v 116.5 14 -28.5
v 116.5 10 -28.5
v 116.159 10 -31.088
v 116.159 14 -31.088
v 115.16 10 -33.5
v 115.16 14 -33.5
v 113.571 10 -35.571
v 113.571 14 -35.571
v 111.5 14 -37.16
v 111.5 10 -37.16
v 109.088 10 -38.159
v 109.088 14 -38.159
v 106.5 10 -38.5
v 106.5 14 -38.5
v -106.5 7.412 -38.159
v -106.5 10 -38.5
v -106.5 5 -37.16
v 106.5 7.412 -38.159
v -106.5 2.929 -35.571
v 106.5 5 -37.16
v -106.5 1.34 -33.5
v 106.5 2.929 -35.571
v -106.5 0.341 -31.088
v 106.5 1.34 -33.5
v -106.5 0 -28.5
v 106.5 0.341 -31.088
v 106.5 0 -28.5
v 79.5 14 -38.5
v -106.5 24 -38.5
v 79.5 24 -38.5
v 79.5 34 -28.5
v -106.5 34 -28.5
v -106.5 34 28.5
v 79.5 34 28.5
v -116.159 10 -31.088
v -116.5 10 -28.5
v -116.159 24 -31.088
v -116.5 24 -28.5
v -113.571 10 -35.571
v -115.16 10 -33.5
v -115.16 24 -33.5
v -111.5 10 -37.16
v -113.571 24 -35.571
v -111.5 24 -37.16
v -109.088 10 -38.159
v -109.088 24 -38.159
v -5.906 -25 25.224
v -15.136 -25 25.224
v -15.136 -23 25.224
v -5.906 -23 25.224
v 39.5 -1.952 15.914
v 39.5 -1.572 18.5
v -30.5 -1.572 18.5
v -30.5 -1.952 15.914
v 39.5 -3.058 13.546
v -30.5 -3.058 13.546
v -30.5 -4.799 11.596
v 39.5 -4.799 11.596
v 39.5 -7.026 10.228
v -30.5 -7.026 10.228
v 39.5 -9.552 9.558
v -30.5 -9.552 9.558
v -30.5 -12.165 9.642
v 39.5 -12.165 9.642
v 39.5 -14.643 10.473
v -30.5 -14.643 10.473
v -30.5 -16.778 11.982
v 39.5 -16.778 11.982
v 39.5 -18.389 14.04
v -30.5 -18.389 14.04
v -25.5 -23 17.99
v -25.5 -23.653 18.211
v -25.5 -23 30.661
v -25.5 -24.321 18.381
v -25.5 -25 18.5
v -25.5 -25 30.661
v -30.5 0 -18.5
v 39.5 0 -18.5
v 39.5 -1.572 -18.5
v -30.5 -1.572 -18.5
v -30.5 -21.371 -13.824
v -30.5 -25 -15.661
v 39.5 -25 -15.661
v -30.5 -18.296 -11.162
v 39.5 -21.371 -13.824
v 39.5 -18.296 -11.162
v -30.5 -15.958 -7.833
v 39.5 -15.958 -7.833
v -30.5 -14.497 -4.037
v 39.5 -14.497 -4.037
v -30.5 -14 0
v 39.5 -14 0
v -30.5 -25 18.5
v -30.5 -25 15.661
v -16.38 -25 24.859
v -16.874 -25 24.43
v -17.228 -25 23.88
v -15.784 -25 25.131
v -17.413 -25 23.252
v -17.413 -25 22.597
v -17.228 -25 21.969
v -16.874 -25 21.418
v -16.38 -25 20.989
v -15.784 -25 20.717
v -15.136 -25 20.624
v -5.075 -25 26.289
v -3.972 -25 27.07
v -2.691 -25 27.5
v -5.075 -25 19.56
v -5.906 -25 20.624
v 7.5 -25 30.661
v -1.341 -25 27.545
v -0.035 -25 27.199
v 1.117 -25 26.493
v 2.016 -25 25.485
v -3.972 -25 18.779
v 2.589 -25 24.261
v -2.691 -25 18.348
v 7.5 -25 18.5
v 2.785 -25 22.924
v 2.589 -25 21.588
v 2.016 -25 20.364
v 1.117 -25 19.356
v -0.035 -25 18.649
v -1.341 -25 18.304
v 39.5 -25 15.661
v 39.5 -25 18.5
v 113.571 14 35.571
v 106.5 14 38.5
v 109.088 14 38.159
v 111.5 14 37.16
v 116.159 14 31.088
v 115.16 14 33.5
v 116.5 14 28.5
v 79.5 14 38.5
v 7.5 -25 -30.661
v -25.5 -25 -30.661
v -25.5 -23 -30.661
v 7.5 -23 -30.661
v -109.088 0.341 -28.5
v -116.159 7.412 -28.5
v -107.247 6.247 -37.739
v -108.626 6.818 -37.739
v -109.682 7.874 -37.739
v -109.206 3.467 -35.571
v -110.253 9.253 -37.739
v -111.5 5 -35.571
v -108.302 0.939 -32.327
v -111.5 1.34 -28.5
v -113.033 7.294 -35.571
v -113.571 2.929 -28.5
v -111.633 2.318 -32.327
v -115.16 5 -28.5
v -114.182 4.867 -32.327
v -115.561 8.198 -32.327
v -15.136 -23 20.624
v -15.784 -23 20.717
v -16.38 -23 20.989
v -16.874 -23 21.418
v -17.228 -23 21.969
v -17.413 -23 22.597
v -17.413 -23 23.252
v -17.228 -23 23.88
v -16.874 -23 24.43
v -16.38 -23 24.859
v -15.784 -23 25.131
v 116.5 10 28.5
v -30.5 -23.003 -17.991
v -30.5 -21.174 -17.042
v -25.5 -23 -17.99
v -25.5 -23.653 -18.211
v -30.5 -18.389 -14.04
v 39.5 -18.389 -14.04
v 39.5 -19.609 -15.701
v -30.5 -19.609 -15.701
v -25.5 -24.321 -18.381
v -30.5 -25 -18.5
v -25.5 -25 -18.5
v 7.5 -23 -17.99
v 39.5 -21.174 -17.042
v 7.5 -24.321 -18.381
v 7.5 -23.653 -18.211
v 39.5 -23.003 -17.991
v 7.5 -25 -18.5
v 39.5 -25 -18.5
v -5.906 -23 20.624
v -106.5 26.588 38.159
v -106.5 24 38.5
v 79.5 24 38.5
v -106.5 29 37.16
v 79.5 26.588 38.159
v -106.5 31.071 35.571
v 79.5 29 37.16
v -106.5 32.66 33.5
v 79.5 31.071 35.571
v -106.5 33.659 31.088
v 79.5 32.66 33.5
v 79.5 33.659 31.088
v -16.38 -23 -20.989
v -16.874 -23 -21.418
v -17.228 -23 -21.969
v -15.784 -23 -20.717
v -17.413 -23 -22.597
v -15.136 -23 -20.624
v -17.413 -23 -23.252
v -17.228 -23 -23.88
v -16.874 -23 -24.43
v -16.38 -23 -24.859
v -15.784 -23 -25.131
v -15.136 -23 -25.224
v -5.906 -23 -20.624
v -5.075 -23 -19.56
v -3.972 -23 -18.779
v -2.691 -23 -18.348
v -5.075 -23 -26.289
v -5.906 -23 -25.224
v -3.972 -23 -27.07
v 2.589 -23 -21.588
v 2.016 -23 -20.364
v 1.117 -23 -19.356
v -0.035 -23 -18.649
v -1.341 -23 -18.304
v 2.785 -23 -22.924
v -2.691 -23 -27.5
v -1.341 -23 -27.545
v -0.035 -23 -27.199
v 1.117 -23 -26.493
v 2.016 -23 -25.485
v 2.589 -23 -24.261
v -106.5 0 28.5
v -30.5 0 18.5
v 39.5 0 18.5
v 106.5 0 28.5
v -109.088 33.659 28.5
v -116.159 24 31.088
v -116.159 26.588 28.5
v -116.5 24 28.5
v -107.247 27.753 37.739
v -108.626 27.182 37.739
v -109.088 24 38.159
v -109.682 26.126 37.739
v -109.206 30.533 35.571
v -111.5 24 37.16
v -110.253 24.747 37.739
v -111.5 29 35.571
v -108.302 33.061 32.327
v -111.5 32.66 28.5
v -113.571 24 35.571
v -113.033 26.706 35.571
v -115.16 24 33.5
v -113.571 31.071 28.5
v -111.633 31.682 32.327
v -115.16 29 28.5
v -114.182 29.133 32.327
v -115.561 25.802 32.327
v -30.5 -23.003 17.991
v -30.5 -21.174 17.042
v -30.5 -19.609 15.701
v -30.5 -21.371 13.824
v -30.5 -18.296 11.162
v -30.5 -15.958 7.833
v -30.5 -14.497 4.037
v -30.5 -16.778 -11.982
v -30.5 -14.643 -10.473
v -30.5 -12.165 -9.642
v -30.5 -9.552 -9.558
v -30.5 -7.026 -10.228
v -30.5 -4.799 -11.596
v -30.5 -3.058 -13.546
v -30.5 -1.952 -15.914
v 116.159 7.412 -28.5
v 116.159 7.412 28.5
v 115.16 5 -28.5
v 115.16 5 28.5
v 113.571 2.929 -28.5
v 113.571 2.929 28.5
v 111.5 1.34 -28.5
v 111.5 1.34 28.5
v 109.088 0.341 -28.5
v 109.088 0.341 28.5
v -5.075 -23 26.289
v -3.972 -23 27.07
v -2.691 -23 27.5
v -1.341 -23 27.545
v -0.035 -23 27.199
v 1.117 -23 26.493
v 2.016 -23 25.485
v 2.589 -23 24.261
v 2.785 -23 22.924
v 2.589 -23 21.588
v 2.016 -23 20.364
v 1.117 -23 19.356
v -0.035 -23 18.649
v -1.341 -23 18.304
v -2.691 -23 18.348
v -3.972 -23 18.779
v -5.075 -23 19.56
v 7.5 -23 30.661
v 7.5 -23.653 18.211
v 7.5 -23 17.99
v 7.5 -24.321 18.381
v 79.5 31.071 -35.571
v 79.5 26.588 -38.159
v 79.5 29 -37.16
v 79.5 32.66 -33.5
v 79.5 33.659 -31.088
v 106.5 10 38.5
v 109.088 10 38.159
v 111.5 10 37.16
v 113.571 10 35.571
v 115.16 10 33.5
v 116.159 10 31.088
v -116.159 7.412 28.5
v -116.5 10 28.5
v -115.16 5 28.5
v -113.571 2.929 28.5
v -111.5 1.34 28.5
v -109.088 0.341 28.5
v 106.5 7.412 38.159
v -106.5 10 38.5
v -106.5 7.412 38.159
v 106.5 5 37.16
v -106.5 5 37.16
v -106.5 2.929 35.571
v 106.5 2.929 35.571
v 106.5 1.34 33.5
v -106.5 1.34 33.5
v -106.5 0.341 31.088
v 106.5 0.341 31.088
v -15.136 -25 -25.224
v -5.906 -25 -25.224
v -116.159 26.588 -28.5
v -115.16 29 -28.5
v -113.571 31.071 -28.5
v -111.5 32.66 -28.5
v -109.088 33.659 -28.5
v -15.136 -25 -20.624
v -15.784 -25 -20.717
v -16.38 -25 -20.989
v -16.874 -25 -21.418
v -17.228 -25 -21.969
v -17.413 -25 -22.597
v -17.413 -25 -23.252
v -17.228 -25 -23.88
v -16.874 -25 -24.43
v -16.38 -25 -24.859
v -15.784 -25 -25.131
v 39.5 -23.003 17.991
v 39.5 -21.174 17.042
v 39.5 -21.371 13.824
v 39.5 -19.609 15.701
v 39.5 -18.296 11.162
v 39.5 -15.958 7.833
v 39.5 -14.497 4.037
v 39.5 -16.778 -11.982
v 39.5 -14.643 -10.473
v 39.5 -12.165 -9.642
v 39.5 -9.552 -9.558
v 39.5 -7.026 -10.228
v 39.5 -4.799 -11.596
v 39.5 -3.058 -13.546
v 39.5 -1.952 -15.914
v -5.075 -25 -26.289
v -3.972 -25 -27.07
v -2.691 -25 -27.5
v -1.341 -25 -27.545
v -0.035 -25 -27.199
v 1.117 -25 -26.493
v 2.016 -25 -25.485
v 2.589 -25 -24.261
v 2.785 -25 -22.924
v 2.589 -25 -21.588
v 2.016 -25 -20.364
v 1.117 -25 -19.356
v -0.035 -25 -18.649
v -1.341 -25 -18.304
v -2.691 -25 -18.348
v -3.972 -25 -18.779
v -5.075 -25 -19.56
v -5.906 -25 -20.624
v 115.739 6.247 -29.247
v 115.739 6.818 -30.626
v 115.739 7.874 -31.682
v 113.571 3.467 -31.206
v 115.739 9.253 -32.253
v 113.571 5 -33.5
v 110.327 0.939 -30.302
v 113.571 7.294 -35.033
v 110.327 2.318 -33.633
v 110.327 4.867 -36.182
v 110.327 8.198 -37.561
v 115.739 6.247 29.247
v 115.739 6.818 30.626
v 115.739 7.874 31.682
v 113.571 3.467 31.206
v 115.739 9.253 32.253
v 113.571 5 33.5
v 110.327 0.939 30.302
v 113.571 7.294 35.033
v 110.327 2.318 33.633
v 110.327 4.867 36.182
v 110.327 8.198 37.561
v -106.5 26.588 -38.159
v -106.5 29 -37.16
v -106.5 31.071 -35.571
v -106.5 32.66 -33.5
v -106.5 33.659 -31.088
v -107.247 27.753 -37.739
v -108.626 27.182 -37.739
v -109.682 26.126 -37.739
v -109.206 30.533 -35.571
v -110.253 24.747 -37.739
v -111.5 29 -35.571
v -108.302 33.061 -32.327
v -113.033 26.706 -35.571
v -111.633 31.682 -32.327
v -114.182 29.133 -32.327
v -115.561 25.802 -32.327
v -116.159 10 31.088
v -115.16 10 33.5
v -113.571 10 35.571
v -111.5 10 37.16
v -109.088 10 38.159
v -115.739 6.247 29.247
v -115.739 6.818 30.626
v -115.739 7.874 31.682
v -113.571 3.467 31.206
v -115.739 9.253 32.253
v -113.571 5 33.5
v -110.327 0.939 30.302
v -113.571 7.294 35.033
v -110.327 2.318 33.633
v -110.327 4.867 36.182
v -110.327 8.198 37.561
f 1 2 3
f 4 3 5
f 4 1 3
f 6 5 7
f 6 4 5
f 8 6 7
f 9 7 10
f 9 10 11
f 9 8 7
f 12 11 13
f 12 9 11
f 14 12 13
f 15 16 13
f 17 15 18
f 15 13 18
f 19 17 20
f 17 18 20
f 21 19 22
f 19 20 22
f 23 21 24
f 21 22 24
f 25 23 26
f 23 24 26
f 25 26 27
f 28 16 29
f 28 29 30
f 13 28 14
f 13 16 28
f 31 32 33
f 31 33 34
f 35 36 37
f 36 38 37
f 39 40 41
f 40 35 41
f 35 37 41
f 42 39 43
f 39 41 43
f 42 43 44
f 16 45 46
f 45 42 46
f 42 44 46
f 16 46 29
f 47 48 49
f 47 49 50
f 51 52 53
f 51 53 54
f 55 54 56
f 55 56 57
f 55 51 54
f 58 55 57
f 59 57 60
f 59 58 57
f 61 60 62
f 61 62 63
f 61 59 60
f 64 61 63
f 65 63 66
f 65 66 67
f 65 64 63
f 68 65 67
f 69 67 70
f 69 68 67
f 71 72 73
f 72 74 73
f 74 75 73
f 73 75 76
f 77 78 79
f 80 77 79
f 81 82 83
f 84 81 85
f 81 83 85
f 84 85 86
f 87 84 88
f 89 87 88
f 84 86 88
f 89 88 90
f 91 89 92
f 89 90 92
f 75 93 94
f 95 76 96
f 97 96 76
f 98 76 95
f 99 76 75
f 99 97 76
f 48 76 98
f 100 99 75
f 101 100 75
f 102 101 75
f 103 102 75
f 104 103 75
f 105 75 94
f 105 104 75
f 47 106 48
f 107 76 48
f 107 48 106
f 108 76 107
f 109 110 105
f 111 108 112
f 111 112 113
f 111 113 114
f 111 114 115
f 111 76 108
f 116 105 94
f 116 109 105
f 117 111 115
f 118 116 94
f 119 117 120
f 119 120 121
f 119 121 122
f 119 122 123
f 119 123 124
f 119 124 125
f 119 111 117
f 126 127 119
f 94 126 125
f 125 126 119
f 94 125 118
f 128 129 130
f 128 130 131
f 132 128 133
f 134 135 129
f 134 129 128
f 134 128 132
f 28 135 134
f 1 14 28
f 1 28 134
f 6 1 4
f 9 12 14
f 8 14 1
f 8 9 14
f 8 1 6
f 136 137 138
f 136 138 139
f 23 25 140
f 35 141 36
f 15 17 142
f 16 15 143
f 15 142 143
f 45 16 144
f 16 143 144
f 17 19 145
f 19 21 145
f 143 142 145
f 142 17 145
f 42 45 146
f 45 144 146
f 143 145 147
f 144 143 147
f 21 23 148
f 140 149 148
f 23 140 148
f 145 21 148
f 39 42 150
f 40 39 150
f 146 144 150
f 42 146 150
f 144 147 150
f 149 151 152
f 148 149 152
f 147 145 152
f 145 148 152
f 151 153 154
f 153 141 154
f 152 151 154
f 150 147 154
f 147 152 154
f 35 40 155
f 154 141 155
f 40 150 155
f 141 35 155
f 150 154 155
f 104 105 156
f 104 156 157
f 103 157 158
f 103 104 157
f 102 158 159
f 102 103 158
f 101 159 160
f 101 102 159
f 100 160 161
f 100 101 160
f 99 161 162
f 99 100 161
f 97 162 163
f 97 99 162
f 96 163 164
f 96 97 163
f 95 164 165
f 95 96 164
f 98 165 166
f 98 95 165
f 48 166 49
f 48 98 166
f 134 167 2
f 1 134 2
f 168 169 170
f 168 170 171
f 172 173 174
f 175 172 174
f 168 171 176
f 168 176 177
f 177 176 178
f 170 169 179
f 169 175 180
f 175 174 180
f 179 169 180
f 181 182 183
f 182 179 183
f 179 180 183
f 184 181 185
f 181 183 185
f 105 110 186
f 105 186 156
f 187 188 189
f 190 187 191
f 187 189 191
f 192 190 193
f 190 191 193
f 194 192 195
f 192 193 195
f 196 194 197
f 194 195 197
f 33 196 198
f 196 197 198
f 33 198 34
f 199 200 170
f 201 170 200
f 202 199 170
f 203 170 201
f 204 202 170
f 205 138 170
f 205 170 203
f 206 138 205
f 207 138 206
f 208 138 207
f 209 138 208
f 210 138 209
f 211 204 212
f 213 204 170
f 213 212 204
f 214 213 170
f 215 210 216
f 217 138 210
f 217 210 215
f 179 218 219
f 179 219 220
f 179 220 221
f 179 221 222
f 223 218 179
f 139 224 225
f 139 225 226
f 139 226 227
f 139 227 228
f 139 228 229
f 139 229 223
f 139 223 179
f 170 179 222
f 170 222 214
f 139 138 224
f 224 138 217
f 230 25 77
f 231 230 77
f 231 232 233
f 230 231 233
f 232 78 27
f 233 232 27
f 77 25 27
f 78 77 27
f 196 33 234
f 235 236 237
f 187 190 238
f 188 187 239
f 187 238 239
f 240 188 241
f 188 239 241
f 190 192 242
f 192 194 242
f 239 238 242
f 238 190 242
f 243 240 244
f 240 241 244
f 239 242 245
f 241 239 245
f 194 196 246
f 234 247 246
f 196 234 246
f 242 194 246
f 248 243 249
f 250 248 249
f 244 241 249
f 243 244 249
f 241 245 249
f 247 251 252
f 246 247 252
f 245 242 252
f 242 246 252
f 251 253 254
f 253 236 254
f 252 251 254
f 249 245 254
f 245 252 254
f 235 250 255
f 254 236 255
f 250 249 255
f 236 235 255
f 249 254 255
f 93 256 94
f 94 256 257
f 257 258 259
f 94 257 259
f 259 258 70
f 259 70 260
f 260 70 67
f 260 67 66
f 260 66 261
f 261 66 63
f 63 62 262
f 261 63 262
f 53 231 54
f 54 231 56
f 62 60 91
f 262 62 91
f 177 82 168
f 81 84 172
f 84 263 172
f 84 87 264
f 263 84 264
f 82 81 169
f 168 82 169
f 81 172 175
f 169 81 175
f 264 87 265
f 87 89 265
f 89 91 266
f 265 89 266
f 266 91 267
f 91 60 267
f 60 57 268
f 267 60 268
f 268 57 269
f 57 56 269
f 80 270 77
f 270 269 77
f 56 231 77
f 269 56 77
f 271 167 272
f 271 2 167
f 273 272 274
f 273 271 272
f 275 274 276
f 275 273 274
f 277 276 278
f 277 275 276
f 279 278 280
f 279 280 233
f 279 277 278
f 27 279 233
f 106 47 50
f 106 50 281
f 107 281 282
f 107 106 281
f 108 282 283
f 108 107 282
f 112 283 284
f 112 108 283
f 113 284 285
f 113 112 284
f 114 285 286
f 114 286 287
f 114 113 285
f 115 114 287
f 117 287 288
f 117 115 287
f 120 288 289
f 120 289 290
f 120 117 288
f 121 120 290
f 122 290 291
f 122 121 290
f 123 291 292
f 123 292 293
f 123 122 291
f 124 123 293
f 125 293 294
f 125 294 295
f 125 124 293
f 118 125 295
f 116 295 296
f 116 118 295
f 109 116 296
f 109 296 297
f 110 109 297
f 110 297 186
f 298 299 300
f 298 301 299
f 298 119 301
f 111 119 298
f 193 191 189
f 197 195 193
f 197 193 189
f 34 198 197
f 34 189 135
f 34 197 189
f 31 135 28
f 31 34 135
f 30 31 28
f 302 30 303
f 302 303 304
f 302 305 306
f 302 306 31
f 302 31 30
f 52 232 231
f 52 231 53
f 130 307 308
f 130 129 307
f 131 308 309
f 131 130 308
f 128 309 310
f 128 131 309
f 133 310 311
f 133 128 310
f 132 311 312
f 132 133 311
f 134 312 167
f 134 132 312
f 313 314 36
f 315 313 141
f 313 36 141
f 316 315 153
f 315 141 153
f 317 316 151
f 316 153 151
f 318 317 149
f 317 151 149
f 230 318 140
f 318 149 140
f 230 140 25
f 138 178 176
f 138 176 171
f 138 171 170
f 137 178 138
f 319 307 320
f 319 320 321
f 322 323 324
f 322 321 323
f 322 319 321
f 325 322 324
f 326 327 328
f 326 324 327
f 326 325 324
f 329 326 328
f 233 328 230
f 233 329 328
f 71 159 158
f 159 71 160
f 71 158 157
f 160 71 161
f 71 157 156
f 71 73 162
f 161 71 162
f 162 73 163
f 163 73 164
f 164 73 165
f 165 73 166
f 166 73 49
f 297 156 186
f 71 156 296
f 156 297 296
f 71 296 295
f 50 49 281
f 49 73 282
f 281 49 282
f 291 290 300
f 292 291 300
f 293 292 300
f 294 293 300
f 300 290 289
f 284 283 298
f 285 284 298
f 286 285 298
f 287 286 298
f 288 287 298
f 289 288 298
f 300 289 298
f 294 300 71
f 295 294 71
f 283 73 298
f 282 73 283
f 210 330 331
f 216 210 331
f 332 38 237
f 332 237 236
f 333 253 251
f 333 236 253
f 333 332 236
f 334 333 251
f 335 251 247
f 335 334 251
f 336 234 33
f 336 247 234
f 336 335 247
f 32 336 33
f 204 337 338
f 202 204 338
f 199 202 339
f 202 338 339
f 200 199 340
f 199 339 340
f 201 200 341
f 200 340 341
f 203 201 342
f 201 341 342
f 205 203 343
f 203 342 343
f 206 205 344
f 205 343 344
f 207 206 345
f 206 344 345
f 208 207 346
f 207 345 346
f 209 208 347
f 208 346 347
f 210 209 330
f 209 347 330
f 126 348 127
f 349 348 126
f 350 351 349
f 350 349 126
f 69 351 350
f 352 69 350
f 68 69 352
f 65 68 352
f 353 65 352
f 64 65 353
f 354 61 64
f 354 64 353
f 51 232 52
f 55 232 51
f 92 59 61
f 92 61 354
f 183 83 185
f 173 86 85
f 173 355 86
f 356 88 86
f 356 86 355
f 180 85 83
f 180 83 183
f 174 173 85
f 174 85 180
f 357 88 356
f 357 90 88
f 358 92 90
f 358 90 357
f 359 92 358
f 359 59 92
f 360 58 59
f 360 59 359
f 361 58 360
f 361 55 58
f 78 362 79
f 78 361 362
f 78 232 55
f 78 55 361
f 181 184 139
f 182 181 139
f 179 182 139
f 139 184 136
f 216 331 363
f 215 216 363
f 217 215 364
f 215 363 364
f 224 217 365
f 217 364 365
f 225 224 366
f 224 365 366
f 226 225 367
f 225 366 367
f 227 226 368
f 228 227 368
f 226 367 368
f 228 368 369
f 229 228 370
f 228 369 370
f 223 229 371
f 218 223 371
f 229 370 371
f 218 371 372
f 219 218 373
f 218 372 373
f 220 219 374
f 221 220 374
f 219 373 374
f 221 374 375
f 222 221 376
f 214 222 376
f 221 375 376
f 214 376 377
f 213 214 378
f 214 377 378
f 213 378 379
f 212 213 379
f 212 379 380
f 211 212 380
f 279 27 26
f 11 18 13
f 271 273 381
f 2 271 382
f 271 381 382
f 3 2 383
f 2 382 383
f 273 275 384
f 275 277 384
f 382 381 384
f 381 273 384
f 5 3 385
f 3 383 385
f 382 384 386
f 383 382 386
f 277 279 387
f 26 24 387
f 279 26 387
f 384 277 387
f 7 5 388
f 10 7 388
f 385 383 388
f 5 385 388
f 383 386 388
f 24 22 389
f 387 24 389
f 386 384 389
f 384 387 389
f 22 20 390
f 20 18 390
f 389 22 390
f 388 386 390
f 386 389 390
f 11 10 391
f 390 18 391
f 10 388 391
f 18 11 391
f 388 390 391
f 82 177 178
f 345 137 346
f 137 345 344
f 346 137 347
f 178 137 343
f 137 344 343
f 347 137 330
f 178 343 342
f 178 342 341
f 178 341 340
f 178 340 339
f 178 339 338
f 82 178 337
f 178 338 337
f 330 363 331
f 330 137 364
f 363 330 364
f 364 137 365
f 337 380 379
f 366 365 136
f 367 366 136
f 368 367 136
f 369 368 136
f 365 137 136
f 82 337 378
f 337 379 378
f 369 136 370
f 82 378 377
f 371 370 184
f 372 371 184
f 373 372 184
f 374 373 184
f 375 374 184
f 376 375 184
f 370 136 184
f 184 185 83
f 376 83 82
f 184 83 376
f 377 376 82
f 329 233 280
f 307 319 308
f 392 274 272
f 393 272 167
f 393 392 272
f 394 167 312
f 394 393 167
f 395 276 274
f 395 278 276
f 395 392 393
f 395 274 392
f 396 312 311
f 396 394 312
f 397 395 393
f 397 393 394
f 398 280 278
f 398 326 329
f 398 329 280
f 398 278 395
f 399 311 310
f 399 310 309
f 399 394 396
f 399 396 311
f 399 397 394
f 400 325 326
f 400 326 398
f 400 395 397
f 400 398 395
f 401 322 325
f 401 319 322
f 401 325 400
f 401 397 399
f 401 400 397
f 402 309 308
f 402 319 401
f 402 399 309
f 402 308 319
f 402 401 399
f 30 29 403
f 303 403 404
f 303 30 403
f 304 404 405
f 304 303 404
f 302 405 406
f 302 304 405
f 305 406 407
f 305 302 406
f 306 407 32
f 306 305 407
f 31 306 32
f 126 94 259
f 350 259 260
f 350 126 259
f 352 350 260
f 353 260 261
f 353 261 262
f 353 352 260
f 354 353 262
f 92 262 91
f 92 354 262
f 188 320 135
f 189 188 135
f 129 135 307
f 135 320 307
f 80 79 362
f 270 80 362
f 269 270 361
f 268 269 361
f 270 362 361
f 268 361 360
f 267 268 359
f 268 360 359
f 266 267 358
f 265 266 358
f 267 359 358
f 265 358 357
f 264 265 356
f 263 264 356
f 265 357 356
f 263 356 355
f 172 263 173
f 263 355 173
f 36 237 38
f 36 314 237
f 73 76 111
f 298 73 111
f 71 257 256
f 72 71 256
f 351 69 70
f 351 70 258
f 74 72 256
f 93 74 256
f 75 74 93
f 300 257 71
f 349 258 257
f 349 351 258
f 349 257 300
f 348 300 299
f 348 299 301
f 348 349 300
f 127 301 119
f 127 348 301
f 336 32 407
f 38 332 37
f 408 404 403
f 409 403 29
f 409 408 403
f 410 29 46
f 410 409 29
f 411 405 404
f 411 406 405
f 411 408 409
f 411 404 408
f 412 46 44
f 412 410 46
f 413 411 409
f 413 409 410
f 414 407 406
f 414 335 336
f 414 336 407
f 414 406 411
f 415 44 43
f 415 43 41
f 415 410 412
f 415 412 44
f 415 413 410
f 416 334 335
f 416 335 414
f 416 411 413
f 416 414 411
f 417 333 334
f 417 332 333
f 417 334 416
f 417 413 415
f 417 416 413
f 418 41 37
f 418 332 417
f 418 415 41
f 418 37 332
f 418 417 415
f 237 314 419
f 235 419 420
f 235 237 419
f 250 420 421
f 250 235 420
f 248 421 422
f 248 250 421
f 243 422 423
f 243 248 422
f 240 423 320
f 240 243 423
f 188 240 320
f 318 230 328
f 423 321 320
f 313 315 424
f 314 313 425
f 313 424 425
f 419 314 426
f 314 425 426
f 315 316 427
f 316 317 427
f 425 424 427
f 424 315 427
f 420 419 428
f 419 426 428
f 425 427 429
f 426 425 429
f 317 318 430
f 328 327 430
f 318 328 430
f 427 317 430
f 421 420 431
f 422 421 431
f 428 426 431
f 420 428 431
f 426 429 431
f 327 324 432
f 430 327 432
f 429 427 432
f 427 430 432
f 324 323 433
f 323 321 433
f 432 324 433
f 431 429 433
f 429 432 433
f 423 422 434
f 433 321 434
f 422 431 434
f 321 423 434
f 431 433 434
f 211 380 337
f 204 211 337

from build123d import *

# Parameters (mm, degrees)
SKETCH_1_W          = 233
SKETCH_1_H          = 77
EXTRUDE_1_DEPTH     = 34
FILLET_1_R          = 10
EXTRUDE_START       = -77
EXTRUDE_2_DEPTH     = 70
SKETCH_5_W          = 59.720713377
SKETCH_5_H          = 124.634532265
CUT_EXTRUDE_1_DEPTH = 20
SKETCH_6_W          = 33
SKETCH_6_H          = 15
EXTRUDE_3_DEPTH     = 2
CUT_EXTRUDE_2_DEPTH = 2


with BuildPart() as part:
    # 草图1 → 凸台-拉伸1 (new body)
    with BuildSketch(Plane(origin=(0, 0, 0), x_dir=(1, 0, 0), z_dir=(0, 1, 0))):
        Rectangle(SKETCH_1_W, SKETCH_1_H)
    extrude(amount=EXTRUDE_1_DEPTH)

    # 圆角1
    fillet_1_edges = [part.edges().sort_by_distance(p)[0] for p in [
        (-116.5, 34, 0),
        (0, 34, 38.5),
        (116.5, 34, 0),
        (0, 0, 38.5),
        (-116.5, 0, 0),
        (0, 0, -38.5),
        (116.5, 0, 0),
        (0, 34, -38.5),
        (116.5, 17, 38.5),
        (-116.5, 17, 38.5),
        (-116.5, 17, -38.5),
        (116.5, 17, -38.5),
    ]]
    fillet(fillet_1_edges, radius=FILLET_1_R)

    # 草图4 → 凸台-拉伸2 (add)
    with BuildSketch(Plane(origin=(116.5, 0, 0), x_dir=(0, 0, -1), z_dir=(1, 0, 0)).offset(EXTRUDE_START)):
        with BuildLine():
            Line((0, 0), (18.5, 0))
            Line((18.5, 0), (18.5, -1.572066466))
            ThreePointArc((18.5, -1.572066466), (9.800777778, -8.264788257), (14.039660918, -18.389059192))
            ThreePointArc((14.039660918, -18.389059192), (17.041590901, -21.173830143), (18.5, -25))
            Line((18.5, -25), (15.661233875, -25))
            ThreePointArc((15.661233875, -25), (9.569146337, -17.024771316), (0, -14))
            Line((0, -14), (0, 0))
        make_face()
    extrude_2 = extrude(amount=-EXTRUDE_2_DEPTH)

    # 草图5 → 切除-拉伸1 (cut)
    with BuildSketch(Plane(origin=(0, 34, 0), x_dir=(1, 0, 0), z_dir=(0, 1, 0))):
        with Locations((109.360356689, 0.216379396)):
            Rectangle(SKETCH_5_W, SKETCH_5_H)
    extrude(amount=-CUT_EXTRUDE_1_DEPTH, mode=Mode.SUBTRACT)

    # 镜向1: 凸台-拉伸2 across plane
    add(extrude_2.mirror(Plane(origin=(-30.5, 0, 0), x_dir=(1, 0, 0), z_dir=(0, 0, 1))))

    # 草图6 → 凸台-拉伸3 (add)
    with BuildSketch(Plane.XZ.offset(25)):
        with Locations((-9, 23.161233875)):
            Rectangle(SKETCH_6_W, SKETCH_6_H)
    extrude_3 = extrude(amount=-EXTRUDE_3_DEPTH)

    # 草图7 → 切除-拉伸2 (cut)
    with BuildSketch(Plane(origin=(0, -25, 0), x_dir=(-1, 0, 0), z_dir=(0, -1, 0))):
        with BuildLine():
            Line((5.906379753, -20.624259192), (15.136057616, -20.624259192))
            ThreePointArc((15.136057616, -20.624259192), (17.436057616, -22.924259192), (15.136057616, -25.224259192))
            Line((15.136057616, -25.224259192), (5.906379753, -25.224259192))
            ThreePointArc((5.906379753, -25.224259192), (-2.784969032, -22.924259192), (5.906379753, -20.624259192))
        make_face()
    cut_extrude_2 = extrude(amount=-CUT_EXTRUDE_2_DEPTH, mode=Mode.SUBTRACT)

    # 镜向2: 凸台-拉伸3, 切除-拉伸2 across plane
    add(extrude_3.mirror(Plane.XY))
    add(cut_extrude_2.mirror(Plane.XY), mode=Mode.SUBTRACT)


solid = part.part
